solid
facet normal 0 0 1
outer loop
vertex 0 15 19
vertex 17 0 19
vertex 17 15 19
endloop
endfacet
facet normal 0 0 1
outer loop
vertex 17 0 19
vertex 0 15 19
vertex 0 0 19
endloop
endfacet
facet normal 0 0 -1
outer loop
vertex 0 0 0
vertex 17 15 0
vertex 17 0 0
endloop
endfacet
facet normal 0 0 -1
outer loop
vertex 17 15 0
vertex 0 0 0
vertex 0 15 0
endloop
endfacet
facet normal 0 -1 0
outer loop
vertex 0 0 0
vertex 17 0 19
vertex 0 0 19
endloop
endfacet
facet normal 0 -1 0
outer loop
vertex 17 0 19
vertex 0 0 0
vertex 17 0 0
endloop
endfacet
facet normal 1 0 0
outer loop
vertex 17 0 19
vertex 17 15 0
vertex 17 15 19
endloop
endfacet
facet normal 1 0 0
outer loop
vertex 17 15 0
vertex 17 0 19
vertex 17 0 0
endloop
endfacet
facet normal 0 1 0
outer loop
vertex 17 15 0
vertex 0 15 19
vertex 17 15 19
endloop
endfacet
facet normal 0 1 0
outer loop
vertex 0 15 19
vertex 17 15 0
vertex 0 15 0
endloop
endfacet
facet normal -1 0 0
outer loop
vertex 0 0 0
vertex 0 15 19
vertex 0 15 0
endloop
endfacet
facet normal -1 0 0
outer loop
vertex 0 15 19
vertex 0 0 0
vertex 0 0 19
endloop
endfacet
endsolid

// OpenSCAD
// Generated by SolidPython 1.0.1 on 2020-07-29 00:46:56


cube(size = [17, 15, 19]);
/***********************************************
*********      SolidPython code:      **********
************************************************
 
# import packages: SolidPython
from solid import *
from solid.utils import *
from itertools import chain, combinations, permutations


class Resize:

    def __init__(self, scad_file):
        self.scad_file = scad_file
        #self.scad_file = import_scad(scad_file)
        # cone/cylinder param:
        self.r1 = 0
        self.r2 = 0
        self.h = 0
        # rectangular prism param:
        self.w = 0
        self.l = 0
        # ellipse param:
        self.r = 0

    # import OpenScad code (file name corresponds to shape)


    # classify shape + parameters
    def assign(self, param1, param2, param3):
        if self.scad_file == 'cone.scad':
            self.r1 = param1
            self.r2 = param2
            self.h = param3
        elif self.scad_file == 'cylinder.scad':
            self.r1 = param1
            self.r2 = param2
            self.h = param3
        elif self.scad_file == 'rectangularPrism.scad':
            self.h = param1
            self.l = param2
            self.w = param3
        else:
            self.r = param1
            self.h = param2

    # resize parameters
    def iterate(self):
        x = range(3, 20, 2)
        i = 1
        if self.scad_file == 'cone.scad':
            tempList = list(permutations(x, 2))
            for temp in tempList:
                param1 = temp[0]
                param2 = temp[1]
                filepath = 'produced_scad_files/' + 'cone' + str(param1) + '_' + str(param2) + '_' + '.scad'
                scad_render_to_file(cylinder(h=param1, r1=param2, r2=0), filepath)

        elif self.scad_file == 'cylinder.scad':
            tempList = list(permutations(x, 3))
            for temp in tempList:
                param1 = temp[0]
                param2 = temp[1]
                filepath = 'produced_scad_files/' + 'cylinder' + str(param1) + '_' + str(param2) + '_' + '.scad'
                scad_render_to_file(cylinder(h=param1, r1=param2, r2=param2), filepath)

        elif self.scad_file == 'rectangularPrism.scad':
            tempList = list(permutations(x, 3))
            for temp in tempList:
                param1 = temp[0]
                param2 = temp[1]
                param3 = temp[2]
                filepath = 'produced_scad_files/' + 'rectangularPrism' + str(param1) + '_' + str(param2) + '_' + str(
                    param3) + '.scad'
                scad_render_to_file(cube(size=(param1, param2, param3)), filepath)

        elif self.scad_file == 'ellipse.scad':
            tempList = list(permutations(x, 4))
            for temp in tempList:
                param1 = temp[0]
                param2 = temp[1]
                param3 = temp[2]
                param4 = temp[3]
                filepath = 'produced_scad_files/' + 'ellipse' + str(param1) + '_' + str(param2) + '_' + str(param3) + '_' + str(param4) + '.scad'
                scad_render_to_file(scale([param1, param2, param3])(sphere(r=param4)), filepath)

    def render_to_scadfile(self):
        scad_render_to_file(scad, 'example.scad') 
 
************************************************/
